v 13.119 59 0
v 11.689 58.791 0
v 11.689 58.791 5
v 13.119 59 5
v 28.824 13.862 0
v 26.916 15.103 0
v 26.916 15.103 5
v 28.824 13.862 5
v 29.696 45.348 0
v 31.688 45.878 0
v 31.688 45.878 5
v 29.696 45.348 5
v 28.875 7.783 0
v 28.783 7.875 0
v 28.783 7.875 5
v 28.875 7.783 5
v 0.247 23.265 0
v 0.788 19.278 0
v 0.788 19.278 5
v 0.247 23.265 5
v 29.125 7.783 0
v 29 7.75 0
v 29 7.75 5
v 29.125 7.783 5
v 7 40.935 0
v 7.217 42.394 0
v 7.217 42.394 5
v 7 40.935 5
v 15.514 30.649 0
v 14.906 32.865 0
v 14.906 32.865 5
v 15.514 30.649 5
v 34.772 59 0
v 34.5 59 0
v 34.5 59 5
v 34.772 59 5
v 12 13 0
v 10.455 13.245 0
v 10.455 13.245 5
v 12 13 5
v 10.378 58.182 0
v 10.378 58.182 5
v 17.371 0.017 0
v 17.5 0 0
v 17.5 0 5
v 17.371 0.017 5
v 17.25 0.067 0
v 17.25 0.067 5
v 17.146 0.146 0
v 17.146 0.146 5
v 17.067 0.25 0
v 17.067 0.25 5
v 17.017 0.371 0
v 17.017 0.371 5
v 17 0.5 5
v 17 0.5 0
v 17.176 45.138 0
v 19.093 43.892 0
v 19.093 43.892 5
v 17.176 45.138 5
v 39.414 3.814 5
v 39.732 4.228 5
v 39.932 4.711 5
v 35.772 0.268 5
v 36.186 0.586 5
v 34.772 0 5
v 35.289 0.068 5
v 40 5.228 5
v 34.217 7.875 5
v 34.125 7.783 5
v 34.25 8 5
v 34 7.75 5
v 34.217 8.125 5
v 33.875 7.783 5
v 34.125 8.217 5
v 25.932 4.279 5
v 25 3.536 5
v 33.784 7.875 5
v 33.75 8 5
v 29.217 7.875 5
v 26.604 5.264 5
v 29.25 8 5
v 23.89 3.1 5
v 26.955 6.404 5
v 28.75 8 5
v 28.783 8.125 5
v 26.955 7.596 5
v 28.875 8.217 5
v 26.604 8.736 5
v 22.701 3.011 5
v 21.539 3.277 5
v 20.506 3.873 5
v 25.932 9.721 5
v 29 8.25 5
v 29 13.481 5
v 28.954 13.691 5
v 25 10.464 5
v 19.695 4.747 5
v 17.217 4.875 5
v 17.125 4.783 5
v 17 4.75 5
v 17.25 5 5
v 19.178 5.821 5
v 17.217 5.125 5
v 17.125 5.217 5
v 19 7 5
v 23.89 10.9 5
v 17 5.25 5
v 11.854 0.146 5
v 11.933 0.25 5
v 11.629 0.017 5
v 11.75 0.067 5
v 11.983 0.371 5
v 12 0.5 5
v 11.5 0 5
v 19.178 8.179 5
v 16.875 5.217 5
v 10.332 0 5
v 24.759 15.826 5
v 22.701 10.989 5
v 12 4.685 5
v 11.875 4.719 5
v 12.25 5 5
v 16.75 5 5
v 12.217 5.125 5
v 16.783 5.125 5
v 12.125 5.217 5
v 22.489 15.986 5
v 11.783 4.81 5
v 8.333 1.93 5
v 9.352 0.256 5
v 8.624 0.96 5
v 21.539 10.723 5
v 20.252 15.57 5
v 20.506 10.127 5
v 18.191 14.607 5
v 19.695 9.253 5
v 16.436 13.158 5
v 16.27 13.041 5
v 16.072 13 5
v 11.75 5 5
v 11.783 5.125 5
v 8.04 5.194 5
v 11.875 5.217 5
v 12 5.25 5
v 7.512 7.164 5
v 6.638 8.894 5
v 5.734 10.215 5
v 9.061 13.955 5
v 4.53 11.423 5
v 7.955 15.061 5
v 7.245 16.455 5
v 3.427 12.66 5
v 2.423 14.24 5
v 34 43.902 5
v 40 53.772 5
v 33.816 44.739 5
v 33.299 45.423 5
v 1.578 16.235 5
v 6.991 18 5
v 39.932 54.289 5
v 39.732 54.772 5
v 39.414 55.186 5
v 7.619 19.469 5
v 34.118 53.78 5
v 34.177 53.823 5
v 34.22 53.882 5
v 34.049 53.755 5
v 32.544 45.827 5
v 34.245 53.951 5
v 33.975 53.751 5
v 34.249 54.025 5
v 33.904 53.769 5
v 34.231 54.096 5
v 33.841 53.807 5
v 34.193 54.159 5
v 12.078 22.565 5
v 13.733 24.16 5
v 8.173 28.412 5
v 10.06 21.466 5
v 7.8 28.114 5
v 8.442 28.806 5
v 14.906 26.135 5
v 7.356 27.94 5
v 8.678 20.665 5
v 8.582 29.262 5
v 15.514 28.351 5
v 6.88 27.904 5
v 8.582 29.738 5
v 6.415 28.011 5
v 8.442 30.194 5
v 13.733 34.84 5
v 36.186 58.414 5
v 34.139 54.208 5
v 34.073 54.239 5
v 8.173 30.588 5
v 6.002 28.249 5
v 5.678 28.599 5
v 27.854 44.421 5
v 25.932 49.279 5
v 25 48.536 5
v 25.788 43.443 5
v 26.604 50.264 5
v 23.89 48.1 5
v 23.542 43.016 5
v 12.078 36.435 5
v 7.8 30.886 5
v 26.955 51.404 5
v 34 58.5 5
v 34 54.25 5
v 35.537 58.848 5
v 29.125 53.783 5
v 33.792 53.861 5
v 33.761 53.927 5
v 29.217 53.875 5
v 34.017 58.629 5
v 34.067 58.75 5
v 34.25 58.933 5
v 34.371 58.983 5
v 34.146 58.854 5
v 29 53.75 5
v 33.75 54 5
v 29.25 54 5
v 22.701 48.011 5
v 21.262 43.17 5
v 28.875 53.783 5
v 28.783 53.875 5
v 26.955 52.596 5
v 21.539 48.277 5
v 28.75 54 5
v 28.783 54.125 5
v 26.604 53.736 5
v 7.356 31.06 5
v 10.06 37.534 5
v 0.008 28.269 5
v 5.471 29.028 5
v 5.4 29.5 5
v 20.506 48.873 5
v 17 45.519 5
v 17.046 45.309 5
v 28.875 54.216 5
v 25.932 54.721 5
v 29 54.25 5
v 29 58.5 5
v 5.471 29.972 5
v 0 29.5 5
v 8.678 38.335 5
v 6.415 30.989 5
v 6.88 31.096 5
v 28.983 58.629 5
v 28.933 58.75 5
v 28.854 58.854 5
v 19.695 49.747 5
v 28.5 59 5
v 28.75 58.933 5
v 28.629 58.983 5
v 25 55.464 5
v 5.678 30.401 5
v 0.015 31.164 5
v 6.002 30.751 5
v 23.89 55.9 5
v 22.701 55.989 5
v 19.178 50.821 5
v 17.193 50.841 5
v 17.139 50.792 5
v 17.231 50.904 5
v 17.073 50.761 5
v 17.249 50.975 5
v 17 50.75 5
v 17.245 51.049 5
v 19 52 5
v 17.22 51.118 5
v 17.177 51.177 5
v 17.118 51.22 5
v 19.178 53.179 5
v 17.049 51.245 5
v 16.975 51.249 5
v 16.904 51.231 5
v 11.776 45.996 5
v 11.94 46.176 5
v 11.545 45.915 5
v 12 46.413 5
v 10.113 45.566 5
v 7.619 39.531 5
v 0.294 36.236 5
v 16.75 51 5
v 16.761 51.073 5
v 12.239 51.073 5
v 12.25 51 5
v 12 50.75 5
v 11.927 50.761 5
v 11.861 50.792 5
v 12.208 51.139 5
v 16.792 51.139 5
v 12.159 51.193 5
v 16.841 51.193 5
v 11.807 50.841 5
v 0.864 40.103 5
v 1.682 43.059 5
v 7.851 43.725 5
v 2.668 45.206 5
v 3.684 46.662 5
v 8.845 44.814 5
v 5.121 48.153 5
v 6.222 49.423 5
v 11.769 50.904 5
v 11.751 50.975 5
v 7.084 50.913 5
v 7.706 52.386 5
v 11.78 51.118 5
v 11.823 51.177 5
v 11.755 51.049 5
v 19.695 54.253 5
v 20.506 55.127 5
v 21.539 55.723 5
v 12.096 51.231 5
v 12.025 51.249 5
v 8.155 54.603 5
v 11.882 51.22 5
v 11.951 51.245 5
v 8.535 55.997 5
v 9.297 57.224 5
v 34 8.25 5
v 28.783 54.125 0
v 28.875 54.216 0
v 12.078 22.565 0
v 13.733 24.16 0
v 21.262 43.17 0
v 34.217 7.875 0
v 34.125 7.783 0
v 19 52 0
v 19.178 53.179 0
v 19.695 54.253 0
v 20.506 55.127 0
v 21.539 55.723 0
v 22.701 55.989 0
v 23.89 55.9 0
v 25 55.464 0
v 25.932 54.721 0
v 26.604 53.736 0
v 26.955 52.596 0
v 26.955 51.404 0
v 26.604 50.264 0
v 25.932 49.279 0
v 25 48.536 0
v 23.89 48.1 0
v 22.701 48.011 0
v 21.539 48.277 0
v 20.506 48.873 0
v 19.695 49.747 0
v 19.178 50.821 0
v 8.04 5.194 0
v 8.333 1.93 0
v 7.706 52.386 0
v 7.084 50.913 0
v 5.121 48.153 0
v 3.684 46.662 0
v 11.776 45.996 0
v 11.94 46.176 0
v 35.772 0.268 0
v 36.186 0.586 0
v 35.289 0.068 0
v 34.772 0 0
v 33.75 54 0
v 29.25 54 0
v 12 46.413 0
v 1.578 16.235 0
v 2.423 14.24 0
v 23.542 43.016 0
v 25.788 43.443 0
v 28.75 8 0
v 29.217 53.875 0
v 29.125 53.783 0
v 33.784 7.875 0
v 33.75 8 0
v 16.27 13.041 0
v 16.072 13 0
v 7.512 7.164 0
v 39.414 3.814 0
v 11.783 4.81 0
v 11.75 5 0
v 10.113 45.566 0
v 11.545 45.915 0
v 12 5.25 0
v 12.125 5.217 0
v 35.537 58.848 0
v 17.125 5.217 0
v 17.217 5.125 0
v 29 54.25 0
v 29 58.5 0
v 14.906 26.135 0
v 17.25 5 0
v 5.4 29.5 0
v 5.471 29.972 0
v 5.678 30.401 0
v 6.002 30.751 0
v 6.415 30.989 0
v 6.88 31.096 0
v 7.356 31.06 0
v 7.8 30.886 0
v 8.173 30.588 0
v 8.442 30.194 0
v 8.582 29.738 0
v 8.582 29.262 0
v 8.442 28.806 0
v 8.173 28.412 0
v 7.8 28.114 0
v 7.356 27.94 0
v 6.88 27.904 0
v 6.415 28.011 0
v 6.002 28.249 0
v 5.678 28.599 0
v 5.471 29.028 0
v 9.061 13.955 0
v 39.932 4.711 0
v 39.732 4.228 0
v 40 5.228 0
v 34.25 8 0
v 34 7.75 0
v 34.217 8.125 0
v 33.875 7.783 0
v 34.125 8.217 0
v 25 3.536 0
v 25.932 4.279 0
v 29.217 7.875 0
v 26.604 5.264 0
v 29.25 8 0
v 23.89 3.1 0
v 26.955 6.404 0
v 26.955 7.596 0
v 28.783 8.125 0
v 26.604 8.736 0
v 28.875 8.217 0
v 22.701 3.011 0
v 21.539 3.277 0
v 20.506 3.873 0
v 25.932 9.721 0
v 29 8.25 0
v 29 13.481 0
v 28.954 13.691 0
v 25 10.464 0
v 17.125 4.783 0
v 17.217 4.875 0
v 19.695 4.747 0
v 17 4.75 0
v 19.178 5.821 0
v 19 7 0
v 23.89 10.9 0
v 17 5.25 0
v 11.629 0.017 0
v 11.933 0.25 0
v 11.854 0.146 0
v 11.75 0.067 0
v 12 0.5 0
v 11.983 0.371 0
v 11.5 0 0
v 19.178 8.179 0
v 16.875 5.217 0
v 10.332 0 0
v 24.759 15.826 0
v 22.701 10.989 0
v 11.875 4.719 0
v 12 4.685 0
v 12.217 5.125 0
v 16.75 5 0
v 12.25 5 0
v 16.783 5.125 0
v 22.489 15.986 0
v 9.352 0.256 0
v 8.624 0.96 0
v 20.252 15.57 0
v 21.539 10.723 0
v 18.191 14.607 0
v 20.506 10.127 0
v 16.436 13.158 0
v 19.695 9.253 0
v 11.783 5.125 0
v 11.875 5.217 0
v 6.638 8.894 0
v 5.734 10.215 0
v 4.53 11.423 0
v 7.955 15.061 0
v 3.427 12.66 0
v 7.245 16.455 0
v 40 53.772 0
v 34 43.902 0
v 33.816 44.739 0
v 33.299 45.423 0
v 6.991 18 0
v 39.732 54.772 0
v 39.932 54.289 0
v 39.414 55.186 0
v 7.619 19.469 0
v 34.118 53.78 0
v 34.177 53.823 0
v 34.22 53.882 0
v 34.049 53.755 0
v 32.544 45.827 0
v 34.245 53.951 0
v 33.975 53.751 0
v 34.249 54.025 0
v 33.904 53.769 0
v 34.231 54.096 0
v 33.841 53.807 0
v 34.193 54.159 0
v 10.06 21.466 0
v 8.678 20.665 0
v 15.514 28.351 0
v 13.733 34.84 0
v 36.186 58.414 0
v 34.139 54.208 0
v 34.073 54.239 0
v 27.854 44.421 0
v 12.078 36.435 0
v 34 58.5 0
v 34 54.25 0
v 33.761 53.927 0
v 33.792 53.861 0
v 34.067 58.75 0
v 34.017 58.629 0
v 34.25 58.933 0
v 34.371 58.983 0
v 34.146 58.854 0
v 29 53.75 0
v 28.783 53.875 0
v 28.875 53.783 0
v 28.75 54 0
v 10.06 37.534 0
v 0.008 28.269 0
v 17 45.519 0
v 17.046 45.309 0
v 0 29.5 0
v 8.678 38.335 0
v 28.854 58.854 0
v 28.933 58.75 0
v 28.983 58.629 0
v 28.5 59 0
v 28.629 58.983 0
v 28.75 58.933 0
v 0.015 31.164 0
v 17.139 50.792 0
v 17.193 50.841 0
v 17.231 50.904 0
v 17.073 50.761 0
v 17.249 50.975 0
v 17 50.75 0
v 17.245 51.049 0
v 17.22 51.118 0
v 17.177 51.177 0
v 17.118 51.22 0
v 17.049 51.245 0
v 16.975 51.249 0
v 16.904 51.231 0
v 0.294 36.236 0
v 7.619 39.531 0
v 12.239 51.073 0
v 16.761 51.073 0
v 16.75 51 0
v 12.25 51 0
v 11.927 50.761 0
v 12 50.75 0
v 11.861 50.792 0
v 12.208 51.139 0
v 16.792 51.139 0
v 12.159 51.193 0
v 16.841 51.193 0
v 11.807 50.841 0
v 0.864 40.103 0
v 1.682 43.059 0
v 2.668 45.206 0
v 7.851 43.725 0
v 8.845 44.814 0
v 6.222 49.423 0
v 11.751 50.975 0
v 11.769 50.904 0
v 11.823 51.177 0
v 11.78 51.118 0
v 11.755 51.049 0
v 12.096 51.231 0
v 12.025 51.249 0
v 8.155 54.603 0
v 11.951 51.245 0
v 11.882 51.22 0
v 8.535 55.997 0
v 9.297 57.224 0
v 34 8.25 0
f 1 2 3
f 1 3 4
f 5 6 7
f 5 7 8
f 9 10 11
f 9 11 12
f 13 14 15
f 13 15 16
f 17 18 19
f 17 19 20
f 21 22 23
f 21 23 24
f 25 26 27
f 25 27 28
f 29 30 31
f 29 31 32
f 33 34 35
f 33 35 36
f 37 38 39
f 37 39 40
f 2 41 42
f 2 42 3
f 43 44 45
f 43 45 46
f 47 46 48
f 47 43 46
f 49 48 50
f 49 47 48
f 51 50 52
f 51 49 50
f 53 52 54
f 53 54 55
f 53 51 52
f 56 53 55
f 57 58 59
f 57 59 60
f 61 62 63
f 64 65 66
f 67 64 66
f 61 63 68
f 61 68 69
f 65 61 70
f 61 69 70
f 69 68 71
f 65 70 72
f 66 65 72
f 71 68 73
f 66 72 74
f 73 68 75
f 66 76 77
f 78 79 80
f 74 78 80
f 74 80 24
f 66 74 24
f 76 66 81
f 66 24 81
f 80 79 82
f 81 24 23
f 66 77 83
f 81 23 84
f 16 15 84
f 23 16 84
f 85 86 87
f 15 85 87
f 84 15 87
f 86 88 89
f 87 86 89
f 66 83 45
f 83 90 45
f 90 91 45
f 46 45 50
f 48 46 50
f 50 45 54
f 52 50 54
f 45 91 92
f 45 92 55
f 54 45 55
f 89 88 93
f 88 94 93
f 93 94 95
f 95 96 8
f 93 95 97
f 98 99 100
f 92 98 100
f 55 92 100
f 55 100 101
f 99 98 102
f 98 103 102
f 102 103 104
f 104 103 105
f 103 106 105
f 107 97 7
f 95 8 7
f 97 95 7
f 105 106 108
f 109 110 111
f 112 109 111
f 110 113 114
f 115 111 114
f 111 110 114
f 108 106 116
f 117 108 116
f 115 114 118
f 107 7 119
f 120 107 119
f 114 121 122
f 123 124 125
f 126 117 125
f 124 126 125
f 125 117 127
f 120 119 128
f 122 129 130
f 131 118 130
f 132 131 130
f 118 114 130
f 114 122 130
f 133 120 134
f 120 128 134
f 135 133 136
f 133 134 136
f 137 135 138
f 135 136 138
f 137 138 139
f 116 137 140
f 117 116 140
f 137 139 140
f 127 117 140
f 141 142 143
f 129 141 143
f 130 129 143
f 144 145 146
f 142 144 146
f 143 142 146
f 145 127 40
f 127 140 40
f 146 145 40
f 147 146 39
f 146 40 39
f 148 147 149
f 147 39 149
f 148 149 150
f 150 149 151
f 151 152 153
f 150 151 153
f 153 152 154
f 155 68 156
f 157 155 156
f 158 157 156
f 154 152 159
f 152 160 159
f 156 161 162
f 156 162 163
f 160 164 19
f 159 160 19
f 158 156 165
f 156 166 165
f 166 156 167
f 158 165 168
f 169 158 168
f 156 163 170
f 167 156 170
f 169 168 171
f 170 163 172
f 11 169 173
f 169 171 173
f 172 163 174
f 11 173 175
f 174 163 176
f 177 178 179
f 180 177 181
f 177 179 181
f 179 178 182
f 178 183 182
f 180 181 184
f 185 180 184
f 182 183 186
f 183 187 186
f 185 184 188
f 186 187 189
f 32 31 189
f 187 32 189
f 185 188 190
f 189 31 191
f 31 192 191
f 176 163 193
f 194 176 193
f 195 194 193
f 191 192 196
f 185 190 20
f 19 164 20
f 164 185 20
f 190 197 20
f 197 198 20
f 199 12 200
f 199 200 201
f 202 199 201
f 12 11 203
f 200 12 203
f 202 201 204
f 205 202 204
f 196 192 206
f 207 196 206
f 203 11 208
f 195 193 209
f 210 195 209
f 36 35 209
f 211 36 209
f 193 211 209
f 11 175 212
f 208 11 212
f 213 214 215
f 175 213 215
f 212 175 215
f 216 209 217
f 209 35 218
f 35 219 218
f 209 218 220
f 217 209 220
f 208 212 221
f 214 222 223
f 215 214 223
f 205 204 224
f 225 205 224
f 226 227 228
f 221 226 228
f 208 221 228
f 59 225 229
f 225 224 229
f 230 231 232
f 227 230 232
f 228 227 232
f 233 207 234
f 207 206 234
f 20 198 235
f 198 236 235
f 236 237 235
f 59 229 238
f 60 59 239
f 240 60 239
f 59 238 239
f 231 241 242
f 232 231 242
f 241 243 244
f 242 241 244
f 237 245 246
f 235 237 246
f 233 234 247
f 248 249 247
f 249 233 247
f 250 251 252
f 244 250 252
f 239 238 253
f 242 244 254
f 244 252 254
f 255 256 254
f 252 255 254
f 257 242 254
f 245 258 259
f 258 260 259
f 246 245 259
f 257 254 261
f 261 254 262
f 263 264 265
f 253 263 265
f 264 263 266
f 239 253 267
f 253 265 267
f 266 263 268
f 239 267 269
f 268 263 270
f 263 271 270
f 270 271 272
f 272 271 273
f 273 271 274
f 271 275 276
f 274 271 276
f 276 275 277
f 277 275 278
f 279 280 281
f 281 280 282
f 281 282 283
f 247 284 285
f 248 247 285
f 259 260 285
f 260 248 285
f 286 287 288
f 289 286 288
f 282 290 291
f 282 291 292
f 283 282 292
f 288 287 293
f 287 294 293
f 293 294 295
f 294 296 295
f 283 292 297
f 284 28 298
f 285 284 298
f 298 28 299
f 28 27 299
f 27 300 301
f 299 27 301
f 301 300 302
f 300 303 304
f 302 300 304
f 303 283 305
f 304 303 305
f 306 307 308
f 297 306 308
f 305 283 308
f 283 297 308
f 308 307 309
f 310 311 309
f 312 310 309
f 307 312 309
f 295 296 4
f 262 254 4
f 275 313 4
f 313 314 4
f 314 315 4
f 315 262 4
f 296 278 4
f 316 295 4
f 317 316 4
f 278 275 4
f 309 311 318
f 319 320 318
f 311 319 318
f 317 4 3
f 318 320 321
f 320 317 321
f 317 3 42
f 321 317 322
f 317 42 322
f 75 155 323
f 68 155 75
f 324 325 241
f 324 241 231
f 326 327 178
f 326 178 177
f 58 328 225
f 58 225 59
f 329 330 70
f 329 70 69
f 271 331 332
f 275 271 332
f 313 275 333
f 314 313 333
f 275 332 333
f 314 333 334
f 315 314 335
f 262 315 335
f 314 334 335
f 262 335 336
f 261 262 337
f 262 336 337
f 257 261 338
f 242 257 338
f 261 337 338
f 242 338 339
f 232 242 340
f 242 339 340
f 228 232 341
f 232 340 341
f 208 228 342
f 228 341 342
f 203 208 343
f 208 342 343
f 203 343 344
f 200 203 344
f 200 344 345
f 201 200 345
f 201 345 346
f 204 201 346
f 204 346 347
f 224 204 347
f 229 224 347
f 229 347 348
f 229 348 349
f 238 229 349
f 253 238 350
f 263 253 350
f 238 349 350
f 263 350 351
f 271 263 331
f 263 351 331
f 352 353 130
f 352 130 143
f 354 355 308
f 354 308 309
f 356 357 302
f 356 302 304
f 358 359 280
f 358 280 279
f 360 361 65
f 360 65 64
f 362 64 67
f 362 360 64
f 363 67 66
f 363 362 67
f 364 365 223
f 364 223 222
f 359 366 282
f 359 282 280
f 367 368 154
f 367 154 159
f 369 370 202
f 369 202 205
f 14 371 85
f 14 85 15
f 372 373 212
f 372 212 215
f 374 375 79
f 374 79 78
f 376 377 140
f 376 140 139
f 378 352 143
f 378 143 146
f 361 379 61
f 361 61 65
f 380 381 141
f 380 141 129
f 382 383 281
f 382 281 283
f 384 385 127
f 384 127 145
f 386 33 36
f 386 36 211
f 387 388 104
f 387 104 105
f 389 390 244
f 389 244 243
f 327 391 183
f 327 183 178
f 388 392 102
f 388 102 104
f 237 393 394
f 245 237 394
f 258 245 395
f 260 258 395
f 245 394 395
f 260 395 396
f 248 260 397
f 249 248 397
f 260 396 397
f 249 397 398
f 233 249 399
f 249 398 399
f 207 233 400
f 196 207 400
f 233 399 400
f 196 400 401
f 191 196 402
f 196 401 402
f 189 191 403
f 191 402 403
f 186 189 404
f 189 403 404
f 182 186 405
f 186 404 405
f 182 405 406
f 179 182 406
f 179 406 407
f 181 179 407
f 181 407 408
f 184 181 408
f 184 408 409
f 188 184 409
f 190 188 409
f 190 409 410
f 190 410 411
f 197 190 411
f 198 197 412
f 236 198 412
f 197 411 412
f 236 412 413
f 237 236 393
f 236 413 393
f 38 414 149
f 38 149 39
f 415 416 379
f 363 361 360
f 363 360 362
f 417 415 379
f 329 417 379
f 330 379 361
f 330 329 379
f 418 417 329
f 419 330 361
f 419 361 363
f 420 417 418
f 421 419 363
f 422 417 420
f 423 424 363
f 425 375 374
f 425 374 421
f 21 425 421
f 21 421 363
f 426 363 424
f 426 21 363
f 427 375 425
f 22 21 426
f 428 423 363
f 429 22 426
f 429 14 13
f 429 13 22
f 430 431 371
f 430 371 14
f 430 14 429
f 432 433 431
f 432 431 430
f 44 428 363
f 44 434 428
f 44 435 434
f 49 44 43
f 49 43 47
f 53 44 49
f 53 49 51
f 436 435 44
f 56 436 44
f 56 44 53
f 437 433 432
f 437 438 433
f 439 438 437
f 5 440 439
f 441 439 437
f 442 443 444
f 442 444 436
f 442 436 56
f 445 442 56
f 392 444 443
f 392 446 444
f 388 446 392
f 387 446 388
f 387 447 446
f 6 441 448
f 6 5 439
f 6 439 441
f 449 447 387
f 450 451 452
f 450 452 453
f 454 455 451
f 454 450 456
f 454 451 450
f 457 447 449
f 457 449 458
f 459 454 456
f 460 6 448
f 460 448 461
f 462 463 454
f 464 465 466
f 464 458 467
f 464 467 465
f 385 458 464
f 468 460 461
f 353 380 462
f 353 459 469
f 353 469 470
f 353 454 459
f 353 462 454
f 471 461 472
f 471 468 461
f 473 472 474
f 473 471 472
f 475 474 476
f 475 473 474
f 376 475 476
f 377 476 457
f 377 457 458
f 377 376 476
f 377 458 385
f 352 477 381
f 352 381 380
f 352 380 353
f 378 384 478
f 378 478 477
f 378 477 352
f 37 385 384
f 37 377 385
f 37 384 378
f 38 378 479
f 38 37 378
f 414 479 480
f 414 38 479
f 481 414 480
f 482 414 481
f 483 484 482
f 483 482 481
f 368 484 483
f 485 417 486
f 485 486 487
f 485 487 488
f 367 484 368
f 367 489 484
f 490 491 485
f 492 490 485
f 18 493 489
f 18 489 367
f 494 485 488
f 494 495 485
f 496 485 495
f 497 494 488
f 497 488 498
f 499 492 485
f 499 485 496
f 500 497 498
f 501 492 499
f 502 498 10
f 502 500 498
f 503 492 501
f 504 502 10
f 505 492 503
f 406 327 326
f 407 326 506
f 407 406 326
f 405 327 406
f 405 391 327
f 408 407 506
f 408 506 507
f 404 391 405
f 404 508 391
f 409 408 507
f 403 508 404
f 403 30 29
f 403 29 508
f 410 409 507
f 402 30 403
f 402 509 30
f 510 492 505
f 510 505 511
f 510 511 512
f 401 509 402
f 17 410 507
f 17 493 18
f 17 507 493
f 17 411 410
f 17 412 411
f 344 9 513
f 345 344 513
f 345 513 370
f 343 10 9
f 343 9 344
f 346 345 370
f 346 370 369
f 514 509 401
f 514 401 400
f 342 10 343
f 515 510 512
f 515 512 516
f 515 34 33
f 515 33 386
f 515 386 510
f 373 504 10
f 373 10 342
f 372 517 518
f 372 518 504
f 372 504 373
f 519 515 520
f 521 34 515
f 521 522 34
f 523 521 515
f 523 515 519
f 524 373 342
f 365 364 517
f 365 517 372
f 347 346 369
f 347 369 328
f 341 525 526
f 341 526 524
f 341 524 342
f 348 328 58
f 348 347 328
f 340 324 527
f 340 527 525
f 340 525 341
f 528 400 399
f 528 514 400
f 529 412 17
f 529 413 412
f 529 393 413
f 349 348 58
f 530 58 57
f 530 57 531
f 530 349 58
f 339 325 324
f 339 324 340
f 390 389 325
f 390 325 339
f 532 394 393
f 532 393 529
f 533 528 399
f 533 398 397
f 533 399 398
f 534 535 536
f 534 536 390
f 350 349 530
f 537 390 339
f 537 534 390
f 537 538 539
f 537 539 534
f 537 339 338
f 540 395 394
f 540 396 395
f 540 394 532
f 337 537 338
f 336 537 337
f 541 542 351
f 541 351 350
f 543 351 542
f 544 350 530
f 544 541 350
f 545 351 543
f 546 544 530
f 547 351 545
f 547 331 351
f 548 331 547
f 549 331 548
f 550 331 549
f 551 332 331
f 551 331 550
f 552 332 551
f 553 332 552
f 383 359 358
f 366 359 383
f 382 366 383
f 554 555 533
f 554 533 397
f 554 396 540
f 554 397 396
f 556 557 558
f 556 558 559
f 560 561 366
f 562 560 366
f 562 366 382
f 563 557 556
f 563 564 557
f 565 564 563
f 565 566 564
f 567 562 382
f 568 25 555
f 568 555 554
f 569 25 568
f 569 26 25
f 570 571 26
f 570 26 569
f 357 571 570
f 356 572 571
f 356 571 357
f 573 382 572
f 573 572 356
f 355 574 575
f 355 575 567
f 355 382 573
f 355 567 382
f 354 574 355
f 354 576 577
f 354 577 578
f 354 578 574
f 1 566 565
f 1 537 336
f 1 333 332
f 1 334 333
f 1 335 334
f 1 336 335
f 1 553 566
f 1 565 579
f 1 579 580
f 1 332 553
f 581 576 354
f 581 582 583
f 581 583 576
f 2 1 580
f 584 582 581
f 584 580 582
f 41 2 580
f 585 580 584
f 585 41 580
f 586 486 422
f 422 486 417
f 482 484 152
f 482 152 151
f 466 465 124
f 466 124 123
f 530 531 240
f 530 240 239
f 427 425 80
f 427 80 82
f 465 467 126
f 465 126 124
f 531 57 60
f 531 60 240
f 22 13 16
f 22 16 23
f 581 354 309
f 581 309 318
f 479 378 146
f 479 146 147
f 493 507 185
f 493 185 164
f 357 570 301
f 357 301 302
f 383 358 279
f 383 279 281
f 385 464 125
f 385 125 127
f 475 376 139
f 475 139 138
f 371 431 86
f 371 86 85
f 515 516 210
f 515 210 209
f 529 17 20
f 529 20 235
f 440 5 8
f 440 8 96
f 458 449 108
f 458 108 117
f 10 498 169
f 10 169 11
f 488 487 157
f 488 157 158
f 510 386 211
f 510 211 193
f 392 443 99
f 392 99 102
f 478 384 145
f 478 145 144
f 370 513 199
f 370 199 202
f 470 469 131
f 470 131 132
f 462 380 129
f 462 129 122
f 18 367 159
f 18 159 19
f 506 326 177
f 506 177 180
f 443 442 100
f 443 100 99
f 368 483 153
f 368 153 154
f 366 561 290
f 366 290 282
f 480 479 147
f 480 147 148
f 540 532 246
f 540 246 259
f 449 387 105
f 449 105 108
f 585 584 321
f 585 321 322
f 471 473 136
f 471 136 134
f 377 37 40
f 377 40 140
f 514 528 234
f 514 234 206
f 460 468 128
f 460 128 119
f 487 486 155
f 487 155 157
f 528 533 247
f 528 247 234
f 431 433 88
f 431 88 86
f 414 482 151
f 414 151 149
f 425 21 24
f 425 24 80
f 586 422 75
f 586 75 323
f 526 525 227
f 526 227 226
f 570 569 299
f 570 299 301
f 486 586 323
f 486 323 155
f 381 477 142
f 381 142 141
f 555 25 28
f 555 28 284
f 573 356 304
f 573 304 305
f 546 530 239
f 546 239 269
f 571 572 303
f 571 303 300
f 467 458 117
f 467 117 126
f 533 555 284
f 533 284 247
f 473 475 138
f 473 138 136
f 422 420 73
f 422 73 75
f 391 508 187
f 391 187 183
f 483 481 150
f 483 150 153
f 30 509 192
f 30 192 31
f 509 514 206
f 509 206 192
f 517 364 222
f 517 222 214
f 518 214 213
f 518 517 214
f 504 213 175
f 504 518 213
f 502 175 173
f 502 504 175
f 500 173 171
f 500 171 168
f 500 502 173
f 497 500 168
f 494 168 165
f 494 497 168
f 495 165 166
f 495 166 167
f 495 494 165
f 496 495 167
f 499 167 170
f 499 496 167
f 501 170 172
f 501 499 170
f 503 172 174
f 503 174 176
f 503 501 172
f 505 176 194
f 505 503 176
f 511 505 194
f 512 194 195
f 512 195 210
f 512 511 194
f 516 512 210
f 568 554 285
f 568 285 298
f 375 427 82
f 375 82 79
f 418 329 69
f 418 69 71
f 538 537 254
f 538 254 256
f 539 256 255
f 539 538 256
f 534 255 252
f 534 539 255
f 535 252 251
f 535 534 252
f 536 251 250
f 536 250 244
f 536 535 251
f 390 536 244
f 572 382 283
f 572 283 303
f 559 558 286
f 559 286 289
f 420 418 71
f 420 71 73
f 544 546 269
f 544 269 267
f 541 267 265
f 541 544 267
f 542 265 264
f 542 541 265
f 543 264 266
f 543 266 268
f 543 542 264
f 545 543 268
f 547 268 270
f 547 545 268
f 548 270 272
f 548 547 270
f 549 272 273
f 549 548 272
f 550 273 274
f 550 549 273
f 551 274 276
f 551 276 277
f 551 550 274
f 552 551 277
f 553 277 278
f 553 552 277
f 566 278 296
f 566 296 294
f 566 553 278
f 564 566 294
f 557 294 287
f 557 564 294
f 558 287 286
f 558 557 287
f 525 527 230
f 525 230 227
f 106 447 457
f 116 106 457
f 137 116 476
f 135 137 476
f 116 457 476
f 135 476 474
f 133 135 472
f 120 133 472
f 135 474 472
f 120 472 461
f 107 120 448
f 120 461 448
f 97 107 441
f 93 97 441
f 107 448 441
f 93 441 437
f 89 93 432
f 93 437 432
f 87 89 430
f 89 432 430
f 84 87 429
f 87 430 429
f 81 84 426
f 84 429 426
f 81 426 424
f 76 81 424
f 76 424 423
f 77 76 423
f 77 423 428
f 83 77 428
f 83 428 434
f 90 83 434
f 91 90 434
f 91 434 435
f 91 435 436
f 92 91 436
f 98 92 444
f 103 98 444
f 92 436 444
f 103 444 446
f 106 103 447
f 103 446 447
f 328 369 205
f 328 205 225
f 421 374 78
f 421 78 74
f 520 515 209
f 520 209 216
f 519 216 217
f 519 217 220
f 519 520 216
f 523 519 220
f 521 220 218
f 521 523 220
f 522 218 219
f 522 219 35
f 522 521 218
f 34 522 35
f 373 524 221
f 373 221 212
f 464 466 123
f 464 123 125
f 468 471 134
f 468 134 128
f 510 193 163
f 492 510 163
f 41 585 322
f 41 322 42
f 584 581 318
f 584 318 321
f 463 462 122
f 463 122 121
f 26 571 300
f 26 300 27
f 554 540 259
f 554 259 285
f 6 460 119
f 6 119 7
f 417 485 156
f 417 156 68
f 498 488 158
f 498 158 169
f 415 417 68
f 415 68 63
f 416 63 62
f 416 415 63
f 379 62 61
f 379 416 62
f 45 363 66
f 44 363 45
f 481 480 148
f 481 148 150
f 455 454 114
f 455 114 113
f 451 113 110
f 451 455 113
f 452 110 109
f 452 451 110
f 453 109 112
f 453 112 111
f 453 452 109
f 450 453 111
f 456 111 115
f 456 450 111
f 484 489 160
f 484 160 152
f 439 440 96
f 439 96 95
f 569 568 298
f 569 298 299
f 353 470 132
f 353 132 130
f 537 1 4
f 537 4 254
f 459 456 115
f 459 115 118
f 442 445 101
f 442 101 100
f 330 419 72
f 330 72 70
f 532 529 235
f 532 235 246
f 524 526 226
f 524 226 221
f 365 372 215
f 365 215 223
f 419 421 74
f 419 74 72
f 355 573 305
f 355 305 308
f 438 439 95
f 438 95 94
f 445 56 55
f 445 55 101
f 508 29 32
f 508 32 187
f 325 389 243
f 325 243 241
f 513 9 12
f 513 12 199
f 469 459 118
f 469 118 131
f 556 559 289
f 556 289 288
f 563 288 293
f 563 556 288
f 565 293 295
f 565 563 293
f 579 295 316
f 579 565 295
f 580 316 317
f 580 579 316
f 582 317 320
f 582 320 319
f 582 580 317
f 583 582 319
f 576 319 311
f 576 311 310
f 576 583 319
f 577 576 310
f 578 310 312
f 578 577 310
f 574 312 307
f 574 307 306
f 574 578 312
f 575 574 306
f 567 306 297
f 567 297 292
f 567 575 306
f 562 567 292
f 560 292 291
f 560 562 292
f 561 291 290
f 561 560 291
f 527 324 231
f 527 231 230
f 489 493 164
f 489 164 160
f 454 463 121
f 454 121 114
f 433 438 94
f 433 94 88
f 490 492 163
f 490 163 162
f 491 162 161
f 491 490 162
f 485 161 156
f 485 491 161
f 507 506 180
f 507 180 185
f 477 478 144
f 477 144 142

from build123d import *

# Parameters (mm, degrees)
ESQUISSE1_R        = 4
ESQUISSE1_R_2      = 1.59999944
BOSS_EXTRU_1_DEPTH = 5


with BuildPart() as part:
    # Esquisse1 → Boss.-Extru.1 (new body)
    with BuildSketch(Plane(origin=(0, 0, 0), x_dir=(-1, 0, 0), z_dir=(0, 0, -1))):
        with BuildLine():
            Line((-8.039665, 5.193958), (-7.511682, 7.163724))
            Line((-7.511682, 7.163724), (-6.637512, 8.89434))
            Line((-6.637512, 8.89434), (-5.734358, 10.21466))
            Line((-5.734358, 10.21466), (-4.529502, 11.42329))
            Line((-4.529502, 11.42329), (-3.426544, 12.65958))
            Line((-3.426544, 12.65958), (-2.422703, 14.23997))
            Line((-2.422703, 14.23997), (-1.578115, 16.23473))
            Line((-1.578115, 16.23473), (-0.7880442, 19.27814))
            Line((-0.7880442, 19.27814), (-0.2469295, 23.26466))
            Line((-0.2469295, 23.26466), (-0.008147676, 28.26909))
            Line((-0.008147676, 28.26909), (0, 29.5))
            Line((0, 29.5), (-0.01509115, 31.16446))
            Line((-0.01509115, 31.16446), (-0.2937396, 36.23574))
            Line((-0.2937396, 36.23574), (-0.8642389, 40.10257))
            Line((-0.8642389, 40.10257), (-1.681502, 43.05889))
            Line((-1.681502, 43.05889), (-2.667923, 45.20577))
            Line((-2.667923, 45.20577), (-3.68381, 46.66188))
            Line((-3.68381, 46.66188), (-5.121313, 48.15284))
            Line((-5.121313, 48.15284), (-6.221777, 49.42276))
            Line((-6.221777, 49.42276), (-7.084233, 50.913))
            Line((-7.084233, 50.913), (-7.705722, 52.38649))
            Line((-7.705722, 52.38649), (-8.155009, 54.60259))
            Line((-8.155009, 54.60259), (-8.534575, 55.99675))
            Line((-8.534575, 55.99675), (-9.29695, 57.22417))
            Line((-9.29695, 57.22417), (-10.37847, 58.18233))
            Line((-10.37847, 58.18233), (-11.68882, 58.79123))
            Line((-11.68882, 58.79123), (-13.11856, 59))
            Line((-13.11856, 59), (-28.5, 59))
            ThreePointArc((-28.5, 59), (-28.853553391, 58.853553391), (-29, 58.5))
            Line((-29, 58.5), (-29, 54.25))
            Line((-29, 54.25), (-28.875, 54.2165))
            Line((-28.875, 54.2165), (-28.78349, 54.125))
            Line((-28.78349, 54.125), (-28.75, 54))
            Line((-28.75, 54), (-28.78349, 53.875))
            Line((-28.78349, 53.875), (-28.875, 53.78349))
            Line((-28.875, 53.78349), (-29, 53.75))
            Line((-29, 53.75), (-29.125, 53.78349))
            Line((-29.125, 53.78349), (-29.21651, 53.875))
            Line((-29.21651, 53.875), (-29.25, 54))
            Line((-29.25, 54), (-33.75, 54))
            ThreePointArc((-33.75, 54), (-34.176776695, 53.823223305), (-34, 54.25))
            Line((-34, 54.25), (-34, 58.5))
            ThreePointArc((-34, 58.5), (-34.146446609, 58.853553391), (-34.5, 59))
            Line((-34.5, 59), (-34.77157, 59))
            Line((-34.77157, 59), (-35.53694, 58.84776))
            Line((-35.53694, 58.84776), (-36.18579, 58.41422))
            Line((-36.18579, 58.41422), (-39.41421372, 55.18578628))
            ThreePointArc((-39.41421372, 55.18578628), (-39.847759129, 54.53693809), (-40, 53.77157))
            Line((-40, 53.77157), (-40, 5.228428))
            ThreePointArc((-40, 5.228428), (-39.847759811, 4.463063957), (-39.414216379, 3.814219379))
            Line((-39.414216379, 3.814219379), (-36.18579, 0.585787))
            ThreePointArc((-36.18579, 0.585787), (-35.536943679, 0.152241095), (-34.771576938, 0))
            Line((-34.771576938, 0), (-17.5, 0))
            ThreePointArc((-17.5, 0), (-17.146446609, 0.146446609), (-17, 0.5))
            Line((-17, 0.5), (-17, 4.75))
            Line((-17, 4.75), (-17.125, 4.783494))
            Line((-17.125, 4.783494), (-17.21651, 4.875))
            Line((-17.21651, 4.875), (-17.25, 5.000001))
            Line((-17.25, 5.000001), (-17.21651, 5.125001))
            Line((-17.21651, 5.125001), (-17.125, 5.216507))
            Line((-17.125, 5.216507), (-17, 5.25))
            Line((-17, 5.25), (-16.875, 5.216507))
            Line((-16.875, 5.216507), (-16.78349, 5.125001))
            Line((-16.78349, 5.125001), (-16.75, 5.000001))
            Line((-16.75, 5.000001), (-12.25, 5.000001))
            Line((-12.25, 5.000001), (-12.21651, 5.125001))
            Line((-12.21651, 5.125001), (-12.125, 5.216507))
            Line((-12.125, 5.216507), (-12, 5.25))
            Line((-12, 5.25), (-11.875, 5.216507))
            Line((-11.875, 5.216507), (-11.78349, 5.125001))
            Line((-11.78349, 5.125001), (-11.75, 5.000001))
            Line((-11.75, 5.000001), (-11.78349, 4.810393211))
            Line((-11.78349, 4.810393211), (-11.875, 4.718887211))
            Line((-11.875, 4.718887211), (-12, 4.685393211))
            Line((-12, 4.685393211), (-12, 0.500001))
            ThreePointArc((-12, 0.500001), (-11.853553098, 0.146446902), (-11.499999, 0))
            Line((-11.499999, 0), (-10.33203, 0))
            Line((-10.33203, 0), (-9.352249, 0.2564304))
            Line((-9.352249, 0.2564304), (-8.623715, 0.9599663))
            Line((-8.623715, 0.9599663), (-8.333246, 1.9302))
            Line((-8.333246, 1.9302), (-8.039665, 5.193958))
        make_face()
        with Locations((-23, 52)):
            Circle(ESQUISSE1_R, mode=Mode.SUBTRACT)
        with Locations((-23, 6.999999)):
            Circle(ESQUISSE1_R, mode=Mode.SUBTRACT)
        with Locations((-7, 29.499999)):
            Circle(ESQUISSE1_R_2, mode=Mode.SUBTRACT)
        with BuildLine():
            Line((-27.85382, 44.42105), (-25.78795, 43.4427))
            Line((-25.78795, 43.4427), (-23.54223, 43.01635))
            Line((-23.54223, 43.01635), (-21.26154, 43.1695))
            Line((-21.26154, 43.1695), (-19.09299, 43.89227))
            Line((-19.09299, 43.89227), (-17.17647, 45.13804))
            Line((-17.17647, 45.13804), (-17.04626, 45.30922))
            Line((-17.04626, 45.30922), (-17, 45.51926))
            Line((-17, 45.51926), (-17, 50.75))
            ThreePointArc((-17, 50.75), (-17.176776695, 51.176776695), (-16.75, 51))
            Line((-16.75, 51), (-12.25, 51))
            ThreePointArc((-12.25, 51), (-11.823223305, 51.176776695), (-12, 50.75))
            Line((-12, 50.75), (-12, 46.412623211))
            Line((-12, 46.412623211), (-11.9404, 46.175873211))
            Line((-11.9404, 46.175873211), (-11.7758, 45.995563211))
            Line((-11.7758, 45.995563211), (-11.54545, 45.914693211))
            Line((-11.54545, 45.914693211), (-10.113, 45.565643211))
            Line((-10.113, 45.565643211), (-8.844621, 44.813993211))
            Line((-8.844621, 44.813993211), (-7.850602, 43.725103211))
            Line((-7.850602, 43.725103211), (-7.217376, 42.393653211))
            Line((-7.217376, 42.393653211), (-7, 40.935393211))
            Line((-7, 40.935393211), (-7.619118173, 39.531113076))
            Line((-7.619118173, 39.531113076), (-8.678014173, 38.335053076))
            Line((-8.678014173, 38.335053076), (-10.060093173, 37.534003076))
            Line((-10.060093173, 37.534003076), (-12.077863173, 36.434693076))
            Line((-12.077863173, 36.434693076), (-13.732523173, 34.840353076))
            Line((-13.732523173, 34.840353076), (-14.905963173, 32.864763076))
            Line((-14.905963173, 32.864763076), (-15.514393173, 30.648993076))
            Line((-15.514393173, 30.648993076), (-15.514393173, 28.351193076))
            Line((-15.514393173, 28.351193076), (-14.905963173, 26.135413076))
            Line((-14.905963173, 26.135413076), (-13.732523173, 24.159833076))
            Line((-13.732523173, 24.159833076), (-12.077863173, 22.565493076))
            Line((-12.077863173, 22.565493076), (-10.060093173, 21.466183076))
            Line((-10.060093173, 21.466183076), (-8.678014173, 20.665133076))
            Line((-8.678014173, 20.665133076), (-7.619118173, 19.469073076))
            Line((-7.619118173, 19.469073076), (-6.991483173, 18.000093076))
            Line((-6.991483173, 18.000093076), (-7.244718, 16.45492))
            Line((-7.244718, 16.45492), (-7.954915, 15.06107))
            Line((-7.954915, 15.06107), (-9.061074, 13.95492))
            Line((-9.061074, 13.95492), (-10.45492, 13.24472))
            Line((-10.45492, 13.24472), (-12, 13))
            Line((-12, 13), (-16.0718, 13))
            Line((-16.0718, 13), (-16.27048, 13.04117))
            Line((-16.27048, 13.04117), (-16.43644, 13.1579))
            Line((-16.43644, 13.1579), (-18.19056, 14.60719))
            Line((-18.19056, 14.60719), (-20.2521, 15.57024))
            Line((-20.2521, 15.57024), (-22.48927, 15.9855))
            Line((-22.48927, 15.9855), (-24.7591, 15.82641))
            Line((-24.7591, 15.82641), (-26.91648, 15.10316))
            Line((-26.91648, 15.10316), (-28.82353, 13.86196))
            Line((-28.82353, 13.86196), (-28.95374, 13.69078))
            Line((-28.95374, 13.69078), (-29, 13.48074))
            Line((-29, 13.48074), (-29, 8.25))
            Line((-29, 8.25), (-28.875, 8.216506))
            Line((-28.875, 8.216506), (-28.78349, 8.125))
            Line((-28.78349, 8.125), (-28.75, 8))
            Line((-28.75, 8), (-28.78349, 7.875001))
            Line((-28.78349, 7.875001), (-28.875, 7.783493))
            Line((-28.875, 7.783493), (-29, 7.750001))
            Line((-29, 7.750001), (-29.125, 7.783493))
            Line((-29.125, 7.783493), (-29.21651, 7.875001))
            Line((-29.21651, 7.875001), (-29.25, 8))
            Line((-29.25, 8), (-33.75, 8))
            Line((-33.75, 8), (-33.7835, 7.875001))
            Line((-33.7835, 7.875001), (-33.875, 7.783493))
            Line((-33.875, 7.783493), (-34, 7.750001))
            Line((-34, 7.750001), (-34.125, 7.783493))
            Line((-34.125, 7.783493), (-34.21651, 7.875001))
            Line((-34.21651, 7.875001), (-34.25, 8))
            Line((-34.25, 8), (-34.21651, 8.125))
            Line((-34.21651, 8.125), (-34.125, 8.216506))
            Line((-34.125, 8.216506), (-34, 8.25))
            Line((-34, 8.25), (-34, 43.90222))
            Line((-34, 43.90222), (-33.81641, 44.73928))
            Line((-33.81641, 44.73928), (-33.29933, 45.42266))
            Line((-33.29933, 45.42266), (-32.54371, 45.8269))
            Line((-32.54371, 45.8269), (-31.68826, 45.87778))
            Line((-31.68826, 45.87778), (-29.69555, 45.34813))
            Line((-29.69555, 45.34813), (-27.85382, 44.42105))
        make_face(mode=Mode.SUBTRACT)
    extrude(amount=-BOSS_EXTRU_1_DEPTH)


solid = part.part
